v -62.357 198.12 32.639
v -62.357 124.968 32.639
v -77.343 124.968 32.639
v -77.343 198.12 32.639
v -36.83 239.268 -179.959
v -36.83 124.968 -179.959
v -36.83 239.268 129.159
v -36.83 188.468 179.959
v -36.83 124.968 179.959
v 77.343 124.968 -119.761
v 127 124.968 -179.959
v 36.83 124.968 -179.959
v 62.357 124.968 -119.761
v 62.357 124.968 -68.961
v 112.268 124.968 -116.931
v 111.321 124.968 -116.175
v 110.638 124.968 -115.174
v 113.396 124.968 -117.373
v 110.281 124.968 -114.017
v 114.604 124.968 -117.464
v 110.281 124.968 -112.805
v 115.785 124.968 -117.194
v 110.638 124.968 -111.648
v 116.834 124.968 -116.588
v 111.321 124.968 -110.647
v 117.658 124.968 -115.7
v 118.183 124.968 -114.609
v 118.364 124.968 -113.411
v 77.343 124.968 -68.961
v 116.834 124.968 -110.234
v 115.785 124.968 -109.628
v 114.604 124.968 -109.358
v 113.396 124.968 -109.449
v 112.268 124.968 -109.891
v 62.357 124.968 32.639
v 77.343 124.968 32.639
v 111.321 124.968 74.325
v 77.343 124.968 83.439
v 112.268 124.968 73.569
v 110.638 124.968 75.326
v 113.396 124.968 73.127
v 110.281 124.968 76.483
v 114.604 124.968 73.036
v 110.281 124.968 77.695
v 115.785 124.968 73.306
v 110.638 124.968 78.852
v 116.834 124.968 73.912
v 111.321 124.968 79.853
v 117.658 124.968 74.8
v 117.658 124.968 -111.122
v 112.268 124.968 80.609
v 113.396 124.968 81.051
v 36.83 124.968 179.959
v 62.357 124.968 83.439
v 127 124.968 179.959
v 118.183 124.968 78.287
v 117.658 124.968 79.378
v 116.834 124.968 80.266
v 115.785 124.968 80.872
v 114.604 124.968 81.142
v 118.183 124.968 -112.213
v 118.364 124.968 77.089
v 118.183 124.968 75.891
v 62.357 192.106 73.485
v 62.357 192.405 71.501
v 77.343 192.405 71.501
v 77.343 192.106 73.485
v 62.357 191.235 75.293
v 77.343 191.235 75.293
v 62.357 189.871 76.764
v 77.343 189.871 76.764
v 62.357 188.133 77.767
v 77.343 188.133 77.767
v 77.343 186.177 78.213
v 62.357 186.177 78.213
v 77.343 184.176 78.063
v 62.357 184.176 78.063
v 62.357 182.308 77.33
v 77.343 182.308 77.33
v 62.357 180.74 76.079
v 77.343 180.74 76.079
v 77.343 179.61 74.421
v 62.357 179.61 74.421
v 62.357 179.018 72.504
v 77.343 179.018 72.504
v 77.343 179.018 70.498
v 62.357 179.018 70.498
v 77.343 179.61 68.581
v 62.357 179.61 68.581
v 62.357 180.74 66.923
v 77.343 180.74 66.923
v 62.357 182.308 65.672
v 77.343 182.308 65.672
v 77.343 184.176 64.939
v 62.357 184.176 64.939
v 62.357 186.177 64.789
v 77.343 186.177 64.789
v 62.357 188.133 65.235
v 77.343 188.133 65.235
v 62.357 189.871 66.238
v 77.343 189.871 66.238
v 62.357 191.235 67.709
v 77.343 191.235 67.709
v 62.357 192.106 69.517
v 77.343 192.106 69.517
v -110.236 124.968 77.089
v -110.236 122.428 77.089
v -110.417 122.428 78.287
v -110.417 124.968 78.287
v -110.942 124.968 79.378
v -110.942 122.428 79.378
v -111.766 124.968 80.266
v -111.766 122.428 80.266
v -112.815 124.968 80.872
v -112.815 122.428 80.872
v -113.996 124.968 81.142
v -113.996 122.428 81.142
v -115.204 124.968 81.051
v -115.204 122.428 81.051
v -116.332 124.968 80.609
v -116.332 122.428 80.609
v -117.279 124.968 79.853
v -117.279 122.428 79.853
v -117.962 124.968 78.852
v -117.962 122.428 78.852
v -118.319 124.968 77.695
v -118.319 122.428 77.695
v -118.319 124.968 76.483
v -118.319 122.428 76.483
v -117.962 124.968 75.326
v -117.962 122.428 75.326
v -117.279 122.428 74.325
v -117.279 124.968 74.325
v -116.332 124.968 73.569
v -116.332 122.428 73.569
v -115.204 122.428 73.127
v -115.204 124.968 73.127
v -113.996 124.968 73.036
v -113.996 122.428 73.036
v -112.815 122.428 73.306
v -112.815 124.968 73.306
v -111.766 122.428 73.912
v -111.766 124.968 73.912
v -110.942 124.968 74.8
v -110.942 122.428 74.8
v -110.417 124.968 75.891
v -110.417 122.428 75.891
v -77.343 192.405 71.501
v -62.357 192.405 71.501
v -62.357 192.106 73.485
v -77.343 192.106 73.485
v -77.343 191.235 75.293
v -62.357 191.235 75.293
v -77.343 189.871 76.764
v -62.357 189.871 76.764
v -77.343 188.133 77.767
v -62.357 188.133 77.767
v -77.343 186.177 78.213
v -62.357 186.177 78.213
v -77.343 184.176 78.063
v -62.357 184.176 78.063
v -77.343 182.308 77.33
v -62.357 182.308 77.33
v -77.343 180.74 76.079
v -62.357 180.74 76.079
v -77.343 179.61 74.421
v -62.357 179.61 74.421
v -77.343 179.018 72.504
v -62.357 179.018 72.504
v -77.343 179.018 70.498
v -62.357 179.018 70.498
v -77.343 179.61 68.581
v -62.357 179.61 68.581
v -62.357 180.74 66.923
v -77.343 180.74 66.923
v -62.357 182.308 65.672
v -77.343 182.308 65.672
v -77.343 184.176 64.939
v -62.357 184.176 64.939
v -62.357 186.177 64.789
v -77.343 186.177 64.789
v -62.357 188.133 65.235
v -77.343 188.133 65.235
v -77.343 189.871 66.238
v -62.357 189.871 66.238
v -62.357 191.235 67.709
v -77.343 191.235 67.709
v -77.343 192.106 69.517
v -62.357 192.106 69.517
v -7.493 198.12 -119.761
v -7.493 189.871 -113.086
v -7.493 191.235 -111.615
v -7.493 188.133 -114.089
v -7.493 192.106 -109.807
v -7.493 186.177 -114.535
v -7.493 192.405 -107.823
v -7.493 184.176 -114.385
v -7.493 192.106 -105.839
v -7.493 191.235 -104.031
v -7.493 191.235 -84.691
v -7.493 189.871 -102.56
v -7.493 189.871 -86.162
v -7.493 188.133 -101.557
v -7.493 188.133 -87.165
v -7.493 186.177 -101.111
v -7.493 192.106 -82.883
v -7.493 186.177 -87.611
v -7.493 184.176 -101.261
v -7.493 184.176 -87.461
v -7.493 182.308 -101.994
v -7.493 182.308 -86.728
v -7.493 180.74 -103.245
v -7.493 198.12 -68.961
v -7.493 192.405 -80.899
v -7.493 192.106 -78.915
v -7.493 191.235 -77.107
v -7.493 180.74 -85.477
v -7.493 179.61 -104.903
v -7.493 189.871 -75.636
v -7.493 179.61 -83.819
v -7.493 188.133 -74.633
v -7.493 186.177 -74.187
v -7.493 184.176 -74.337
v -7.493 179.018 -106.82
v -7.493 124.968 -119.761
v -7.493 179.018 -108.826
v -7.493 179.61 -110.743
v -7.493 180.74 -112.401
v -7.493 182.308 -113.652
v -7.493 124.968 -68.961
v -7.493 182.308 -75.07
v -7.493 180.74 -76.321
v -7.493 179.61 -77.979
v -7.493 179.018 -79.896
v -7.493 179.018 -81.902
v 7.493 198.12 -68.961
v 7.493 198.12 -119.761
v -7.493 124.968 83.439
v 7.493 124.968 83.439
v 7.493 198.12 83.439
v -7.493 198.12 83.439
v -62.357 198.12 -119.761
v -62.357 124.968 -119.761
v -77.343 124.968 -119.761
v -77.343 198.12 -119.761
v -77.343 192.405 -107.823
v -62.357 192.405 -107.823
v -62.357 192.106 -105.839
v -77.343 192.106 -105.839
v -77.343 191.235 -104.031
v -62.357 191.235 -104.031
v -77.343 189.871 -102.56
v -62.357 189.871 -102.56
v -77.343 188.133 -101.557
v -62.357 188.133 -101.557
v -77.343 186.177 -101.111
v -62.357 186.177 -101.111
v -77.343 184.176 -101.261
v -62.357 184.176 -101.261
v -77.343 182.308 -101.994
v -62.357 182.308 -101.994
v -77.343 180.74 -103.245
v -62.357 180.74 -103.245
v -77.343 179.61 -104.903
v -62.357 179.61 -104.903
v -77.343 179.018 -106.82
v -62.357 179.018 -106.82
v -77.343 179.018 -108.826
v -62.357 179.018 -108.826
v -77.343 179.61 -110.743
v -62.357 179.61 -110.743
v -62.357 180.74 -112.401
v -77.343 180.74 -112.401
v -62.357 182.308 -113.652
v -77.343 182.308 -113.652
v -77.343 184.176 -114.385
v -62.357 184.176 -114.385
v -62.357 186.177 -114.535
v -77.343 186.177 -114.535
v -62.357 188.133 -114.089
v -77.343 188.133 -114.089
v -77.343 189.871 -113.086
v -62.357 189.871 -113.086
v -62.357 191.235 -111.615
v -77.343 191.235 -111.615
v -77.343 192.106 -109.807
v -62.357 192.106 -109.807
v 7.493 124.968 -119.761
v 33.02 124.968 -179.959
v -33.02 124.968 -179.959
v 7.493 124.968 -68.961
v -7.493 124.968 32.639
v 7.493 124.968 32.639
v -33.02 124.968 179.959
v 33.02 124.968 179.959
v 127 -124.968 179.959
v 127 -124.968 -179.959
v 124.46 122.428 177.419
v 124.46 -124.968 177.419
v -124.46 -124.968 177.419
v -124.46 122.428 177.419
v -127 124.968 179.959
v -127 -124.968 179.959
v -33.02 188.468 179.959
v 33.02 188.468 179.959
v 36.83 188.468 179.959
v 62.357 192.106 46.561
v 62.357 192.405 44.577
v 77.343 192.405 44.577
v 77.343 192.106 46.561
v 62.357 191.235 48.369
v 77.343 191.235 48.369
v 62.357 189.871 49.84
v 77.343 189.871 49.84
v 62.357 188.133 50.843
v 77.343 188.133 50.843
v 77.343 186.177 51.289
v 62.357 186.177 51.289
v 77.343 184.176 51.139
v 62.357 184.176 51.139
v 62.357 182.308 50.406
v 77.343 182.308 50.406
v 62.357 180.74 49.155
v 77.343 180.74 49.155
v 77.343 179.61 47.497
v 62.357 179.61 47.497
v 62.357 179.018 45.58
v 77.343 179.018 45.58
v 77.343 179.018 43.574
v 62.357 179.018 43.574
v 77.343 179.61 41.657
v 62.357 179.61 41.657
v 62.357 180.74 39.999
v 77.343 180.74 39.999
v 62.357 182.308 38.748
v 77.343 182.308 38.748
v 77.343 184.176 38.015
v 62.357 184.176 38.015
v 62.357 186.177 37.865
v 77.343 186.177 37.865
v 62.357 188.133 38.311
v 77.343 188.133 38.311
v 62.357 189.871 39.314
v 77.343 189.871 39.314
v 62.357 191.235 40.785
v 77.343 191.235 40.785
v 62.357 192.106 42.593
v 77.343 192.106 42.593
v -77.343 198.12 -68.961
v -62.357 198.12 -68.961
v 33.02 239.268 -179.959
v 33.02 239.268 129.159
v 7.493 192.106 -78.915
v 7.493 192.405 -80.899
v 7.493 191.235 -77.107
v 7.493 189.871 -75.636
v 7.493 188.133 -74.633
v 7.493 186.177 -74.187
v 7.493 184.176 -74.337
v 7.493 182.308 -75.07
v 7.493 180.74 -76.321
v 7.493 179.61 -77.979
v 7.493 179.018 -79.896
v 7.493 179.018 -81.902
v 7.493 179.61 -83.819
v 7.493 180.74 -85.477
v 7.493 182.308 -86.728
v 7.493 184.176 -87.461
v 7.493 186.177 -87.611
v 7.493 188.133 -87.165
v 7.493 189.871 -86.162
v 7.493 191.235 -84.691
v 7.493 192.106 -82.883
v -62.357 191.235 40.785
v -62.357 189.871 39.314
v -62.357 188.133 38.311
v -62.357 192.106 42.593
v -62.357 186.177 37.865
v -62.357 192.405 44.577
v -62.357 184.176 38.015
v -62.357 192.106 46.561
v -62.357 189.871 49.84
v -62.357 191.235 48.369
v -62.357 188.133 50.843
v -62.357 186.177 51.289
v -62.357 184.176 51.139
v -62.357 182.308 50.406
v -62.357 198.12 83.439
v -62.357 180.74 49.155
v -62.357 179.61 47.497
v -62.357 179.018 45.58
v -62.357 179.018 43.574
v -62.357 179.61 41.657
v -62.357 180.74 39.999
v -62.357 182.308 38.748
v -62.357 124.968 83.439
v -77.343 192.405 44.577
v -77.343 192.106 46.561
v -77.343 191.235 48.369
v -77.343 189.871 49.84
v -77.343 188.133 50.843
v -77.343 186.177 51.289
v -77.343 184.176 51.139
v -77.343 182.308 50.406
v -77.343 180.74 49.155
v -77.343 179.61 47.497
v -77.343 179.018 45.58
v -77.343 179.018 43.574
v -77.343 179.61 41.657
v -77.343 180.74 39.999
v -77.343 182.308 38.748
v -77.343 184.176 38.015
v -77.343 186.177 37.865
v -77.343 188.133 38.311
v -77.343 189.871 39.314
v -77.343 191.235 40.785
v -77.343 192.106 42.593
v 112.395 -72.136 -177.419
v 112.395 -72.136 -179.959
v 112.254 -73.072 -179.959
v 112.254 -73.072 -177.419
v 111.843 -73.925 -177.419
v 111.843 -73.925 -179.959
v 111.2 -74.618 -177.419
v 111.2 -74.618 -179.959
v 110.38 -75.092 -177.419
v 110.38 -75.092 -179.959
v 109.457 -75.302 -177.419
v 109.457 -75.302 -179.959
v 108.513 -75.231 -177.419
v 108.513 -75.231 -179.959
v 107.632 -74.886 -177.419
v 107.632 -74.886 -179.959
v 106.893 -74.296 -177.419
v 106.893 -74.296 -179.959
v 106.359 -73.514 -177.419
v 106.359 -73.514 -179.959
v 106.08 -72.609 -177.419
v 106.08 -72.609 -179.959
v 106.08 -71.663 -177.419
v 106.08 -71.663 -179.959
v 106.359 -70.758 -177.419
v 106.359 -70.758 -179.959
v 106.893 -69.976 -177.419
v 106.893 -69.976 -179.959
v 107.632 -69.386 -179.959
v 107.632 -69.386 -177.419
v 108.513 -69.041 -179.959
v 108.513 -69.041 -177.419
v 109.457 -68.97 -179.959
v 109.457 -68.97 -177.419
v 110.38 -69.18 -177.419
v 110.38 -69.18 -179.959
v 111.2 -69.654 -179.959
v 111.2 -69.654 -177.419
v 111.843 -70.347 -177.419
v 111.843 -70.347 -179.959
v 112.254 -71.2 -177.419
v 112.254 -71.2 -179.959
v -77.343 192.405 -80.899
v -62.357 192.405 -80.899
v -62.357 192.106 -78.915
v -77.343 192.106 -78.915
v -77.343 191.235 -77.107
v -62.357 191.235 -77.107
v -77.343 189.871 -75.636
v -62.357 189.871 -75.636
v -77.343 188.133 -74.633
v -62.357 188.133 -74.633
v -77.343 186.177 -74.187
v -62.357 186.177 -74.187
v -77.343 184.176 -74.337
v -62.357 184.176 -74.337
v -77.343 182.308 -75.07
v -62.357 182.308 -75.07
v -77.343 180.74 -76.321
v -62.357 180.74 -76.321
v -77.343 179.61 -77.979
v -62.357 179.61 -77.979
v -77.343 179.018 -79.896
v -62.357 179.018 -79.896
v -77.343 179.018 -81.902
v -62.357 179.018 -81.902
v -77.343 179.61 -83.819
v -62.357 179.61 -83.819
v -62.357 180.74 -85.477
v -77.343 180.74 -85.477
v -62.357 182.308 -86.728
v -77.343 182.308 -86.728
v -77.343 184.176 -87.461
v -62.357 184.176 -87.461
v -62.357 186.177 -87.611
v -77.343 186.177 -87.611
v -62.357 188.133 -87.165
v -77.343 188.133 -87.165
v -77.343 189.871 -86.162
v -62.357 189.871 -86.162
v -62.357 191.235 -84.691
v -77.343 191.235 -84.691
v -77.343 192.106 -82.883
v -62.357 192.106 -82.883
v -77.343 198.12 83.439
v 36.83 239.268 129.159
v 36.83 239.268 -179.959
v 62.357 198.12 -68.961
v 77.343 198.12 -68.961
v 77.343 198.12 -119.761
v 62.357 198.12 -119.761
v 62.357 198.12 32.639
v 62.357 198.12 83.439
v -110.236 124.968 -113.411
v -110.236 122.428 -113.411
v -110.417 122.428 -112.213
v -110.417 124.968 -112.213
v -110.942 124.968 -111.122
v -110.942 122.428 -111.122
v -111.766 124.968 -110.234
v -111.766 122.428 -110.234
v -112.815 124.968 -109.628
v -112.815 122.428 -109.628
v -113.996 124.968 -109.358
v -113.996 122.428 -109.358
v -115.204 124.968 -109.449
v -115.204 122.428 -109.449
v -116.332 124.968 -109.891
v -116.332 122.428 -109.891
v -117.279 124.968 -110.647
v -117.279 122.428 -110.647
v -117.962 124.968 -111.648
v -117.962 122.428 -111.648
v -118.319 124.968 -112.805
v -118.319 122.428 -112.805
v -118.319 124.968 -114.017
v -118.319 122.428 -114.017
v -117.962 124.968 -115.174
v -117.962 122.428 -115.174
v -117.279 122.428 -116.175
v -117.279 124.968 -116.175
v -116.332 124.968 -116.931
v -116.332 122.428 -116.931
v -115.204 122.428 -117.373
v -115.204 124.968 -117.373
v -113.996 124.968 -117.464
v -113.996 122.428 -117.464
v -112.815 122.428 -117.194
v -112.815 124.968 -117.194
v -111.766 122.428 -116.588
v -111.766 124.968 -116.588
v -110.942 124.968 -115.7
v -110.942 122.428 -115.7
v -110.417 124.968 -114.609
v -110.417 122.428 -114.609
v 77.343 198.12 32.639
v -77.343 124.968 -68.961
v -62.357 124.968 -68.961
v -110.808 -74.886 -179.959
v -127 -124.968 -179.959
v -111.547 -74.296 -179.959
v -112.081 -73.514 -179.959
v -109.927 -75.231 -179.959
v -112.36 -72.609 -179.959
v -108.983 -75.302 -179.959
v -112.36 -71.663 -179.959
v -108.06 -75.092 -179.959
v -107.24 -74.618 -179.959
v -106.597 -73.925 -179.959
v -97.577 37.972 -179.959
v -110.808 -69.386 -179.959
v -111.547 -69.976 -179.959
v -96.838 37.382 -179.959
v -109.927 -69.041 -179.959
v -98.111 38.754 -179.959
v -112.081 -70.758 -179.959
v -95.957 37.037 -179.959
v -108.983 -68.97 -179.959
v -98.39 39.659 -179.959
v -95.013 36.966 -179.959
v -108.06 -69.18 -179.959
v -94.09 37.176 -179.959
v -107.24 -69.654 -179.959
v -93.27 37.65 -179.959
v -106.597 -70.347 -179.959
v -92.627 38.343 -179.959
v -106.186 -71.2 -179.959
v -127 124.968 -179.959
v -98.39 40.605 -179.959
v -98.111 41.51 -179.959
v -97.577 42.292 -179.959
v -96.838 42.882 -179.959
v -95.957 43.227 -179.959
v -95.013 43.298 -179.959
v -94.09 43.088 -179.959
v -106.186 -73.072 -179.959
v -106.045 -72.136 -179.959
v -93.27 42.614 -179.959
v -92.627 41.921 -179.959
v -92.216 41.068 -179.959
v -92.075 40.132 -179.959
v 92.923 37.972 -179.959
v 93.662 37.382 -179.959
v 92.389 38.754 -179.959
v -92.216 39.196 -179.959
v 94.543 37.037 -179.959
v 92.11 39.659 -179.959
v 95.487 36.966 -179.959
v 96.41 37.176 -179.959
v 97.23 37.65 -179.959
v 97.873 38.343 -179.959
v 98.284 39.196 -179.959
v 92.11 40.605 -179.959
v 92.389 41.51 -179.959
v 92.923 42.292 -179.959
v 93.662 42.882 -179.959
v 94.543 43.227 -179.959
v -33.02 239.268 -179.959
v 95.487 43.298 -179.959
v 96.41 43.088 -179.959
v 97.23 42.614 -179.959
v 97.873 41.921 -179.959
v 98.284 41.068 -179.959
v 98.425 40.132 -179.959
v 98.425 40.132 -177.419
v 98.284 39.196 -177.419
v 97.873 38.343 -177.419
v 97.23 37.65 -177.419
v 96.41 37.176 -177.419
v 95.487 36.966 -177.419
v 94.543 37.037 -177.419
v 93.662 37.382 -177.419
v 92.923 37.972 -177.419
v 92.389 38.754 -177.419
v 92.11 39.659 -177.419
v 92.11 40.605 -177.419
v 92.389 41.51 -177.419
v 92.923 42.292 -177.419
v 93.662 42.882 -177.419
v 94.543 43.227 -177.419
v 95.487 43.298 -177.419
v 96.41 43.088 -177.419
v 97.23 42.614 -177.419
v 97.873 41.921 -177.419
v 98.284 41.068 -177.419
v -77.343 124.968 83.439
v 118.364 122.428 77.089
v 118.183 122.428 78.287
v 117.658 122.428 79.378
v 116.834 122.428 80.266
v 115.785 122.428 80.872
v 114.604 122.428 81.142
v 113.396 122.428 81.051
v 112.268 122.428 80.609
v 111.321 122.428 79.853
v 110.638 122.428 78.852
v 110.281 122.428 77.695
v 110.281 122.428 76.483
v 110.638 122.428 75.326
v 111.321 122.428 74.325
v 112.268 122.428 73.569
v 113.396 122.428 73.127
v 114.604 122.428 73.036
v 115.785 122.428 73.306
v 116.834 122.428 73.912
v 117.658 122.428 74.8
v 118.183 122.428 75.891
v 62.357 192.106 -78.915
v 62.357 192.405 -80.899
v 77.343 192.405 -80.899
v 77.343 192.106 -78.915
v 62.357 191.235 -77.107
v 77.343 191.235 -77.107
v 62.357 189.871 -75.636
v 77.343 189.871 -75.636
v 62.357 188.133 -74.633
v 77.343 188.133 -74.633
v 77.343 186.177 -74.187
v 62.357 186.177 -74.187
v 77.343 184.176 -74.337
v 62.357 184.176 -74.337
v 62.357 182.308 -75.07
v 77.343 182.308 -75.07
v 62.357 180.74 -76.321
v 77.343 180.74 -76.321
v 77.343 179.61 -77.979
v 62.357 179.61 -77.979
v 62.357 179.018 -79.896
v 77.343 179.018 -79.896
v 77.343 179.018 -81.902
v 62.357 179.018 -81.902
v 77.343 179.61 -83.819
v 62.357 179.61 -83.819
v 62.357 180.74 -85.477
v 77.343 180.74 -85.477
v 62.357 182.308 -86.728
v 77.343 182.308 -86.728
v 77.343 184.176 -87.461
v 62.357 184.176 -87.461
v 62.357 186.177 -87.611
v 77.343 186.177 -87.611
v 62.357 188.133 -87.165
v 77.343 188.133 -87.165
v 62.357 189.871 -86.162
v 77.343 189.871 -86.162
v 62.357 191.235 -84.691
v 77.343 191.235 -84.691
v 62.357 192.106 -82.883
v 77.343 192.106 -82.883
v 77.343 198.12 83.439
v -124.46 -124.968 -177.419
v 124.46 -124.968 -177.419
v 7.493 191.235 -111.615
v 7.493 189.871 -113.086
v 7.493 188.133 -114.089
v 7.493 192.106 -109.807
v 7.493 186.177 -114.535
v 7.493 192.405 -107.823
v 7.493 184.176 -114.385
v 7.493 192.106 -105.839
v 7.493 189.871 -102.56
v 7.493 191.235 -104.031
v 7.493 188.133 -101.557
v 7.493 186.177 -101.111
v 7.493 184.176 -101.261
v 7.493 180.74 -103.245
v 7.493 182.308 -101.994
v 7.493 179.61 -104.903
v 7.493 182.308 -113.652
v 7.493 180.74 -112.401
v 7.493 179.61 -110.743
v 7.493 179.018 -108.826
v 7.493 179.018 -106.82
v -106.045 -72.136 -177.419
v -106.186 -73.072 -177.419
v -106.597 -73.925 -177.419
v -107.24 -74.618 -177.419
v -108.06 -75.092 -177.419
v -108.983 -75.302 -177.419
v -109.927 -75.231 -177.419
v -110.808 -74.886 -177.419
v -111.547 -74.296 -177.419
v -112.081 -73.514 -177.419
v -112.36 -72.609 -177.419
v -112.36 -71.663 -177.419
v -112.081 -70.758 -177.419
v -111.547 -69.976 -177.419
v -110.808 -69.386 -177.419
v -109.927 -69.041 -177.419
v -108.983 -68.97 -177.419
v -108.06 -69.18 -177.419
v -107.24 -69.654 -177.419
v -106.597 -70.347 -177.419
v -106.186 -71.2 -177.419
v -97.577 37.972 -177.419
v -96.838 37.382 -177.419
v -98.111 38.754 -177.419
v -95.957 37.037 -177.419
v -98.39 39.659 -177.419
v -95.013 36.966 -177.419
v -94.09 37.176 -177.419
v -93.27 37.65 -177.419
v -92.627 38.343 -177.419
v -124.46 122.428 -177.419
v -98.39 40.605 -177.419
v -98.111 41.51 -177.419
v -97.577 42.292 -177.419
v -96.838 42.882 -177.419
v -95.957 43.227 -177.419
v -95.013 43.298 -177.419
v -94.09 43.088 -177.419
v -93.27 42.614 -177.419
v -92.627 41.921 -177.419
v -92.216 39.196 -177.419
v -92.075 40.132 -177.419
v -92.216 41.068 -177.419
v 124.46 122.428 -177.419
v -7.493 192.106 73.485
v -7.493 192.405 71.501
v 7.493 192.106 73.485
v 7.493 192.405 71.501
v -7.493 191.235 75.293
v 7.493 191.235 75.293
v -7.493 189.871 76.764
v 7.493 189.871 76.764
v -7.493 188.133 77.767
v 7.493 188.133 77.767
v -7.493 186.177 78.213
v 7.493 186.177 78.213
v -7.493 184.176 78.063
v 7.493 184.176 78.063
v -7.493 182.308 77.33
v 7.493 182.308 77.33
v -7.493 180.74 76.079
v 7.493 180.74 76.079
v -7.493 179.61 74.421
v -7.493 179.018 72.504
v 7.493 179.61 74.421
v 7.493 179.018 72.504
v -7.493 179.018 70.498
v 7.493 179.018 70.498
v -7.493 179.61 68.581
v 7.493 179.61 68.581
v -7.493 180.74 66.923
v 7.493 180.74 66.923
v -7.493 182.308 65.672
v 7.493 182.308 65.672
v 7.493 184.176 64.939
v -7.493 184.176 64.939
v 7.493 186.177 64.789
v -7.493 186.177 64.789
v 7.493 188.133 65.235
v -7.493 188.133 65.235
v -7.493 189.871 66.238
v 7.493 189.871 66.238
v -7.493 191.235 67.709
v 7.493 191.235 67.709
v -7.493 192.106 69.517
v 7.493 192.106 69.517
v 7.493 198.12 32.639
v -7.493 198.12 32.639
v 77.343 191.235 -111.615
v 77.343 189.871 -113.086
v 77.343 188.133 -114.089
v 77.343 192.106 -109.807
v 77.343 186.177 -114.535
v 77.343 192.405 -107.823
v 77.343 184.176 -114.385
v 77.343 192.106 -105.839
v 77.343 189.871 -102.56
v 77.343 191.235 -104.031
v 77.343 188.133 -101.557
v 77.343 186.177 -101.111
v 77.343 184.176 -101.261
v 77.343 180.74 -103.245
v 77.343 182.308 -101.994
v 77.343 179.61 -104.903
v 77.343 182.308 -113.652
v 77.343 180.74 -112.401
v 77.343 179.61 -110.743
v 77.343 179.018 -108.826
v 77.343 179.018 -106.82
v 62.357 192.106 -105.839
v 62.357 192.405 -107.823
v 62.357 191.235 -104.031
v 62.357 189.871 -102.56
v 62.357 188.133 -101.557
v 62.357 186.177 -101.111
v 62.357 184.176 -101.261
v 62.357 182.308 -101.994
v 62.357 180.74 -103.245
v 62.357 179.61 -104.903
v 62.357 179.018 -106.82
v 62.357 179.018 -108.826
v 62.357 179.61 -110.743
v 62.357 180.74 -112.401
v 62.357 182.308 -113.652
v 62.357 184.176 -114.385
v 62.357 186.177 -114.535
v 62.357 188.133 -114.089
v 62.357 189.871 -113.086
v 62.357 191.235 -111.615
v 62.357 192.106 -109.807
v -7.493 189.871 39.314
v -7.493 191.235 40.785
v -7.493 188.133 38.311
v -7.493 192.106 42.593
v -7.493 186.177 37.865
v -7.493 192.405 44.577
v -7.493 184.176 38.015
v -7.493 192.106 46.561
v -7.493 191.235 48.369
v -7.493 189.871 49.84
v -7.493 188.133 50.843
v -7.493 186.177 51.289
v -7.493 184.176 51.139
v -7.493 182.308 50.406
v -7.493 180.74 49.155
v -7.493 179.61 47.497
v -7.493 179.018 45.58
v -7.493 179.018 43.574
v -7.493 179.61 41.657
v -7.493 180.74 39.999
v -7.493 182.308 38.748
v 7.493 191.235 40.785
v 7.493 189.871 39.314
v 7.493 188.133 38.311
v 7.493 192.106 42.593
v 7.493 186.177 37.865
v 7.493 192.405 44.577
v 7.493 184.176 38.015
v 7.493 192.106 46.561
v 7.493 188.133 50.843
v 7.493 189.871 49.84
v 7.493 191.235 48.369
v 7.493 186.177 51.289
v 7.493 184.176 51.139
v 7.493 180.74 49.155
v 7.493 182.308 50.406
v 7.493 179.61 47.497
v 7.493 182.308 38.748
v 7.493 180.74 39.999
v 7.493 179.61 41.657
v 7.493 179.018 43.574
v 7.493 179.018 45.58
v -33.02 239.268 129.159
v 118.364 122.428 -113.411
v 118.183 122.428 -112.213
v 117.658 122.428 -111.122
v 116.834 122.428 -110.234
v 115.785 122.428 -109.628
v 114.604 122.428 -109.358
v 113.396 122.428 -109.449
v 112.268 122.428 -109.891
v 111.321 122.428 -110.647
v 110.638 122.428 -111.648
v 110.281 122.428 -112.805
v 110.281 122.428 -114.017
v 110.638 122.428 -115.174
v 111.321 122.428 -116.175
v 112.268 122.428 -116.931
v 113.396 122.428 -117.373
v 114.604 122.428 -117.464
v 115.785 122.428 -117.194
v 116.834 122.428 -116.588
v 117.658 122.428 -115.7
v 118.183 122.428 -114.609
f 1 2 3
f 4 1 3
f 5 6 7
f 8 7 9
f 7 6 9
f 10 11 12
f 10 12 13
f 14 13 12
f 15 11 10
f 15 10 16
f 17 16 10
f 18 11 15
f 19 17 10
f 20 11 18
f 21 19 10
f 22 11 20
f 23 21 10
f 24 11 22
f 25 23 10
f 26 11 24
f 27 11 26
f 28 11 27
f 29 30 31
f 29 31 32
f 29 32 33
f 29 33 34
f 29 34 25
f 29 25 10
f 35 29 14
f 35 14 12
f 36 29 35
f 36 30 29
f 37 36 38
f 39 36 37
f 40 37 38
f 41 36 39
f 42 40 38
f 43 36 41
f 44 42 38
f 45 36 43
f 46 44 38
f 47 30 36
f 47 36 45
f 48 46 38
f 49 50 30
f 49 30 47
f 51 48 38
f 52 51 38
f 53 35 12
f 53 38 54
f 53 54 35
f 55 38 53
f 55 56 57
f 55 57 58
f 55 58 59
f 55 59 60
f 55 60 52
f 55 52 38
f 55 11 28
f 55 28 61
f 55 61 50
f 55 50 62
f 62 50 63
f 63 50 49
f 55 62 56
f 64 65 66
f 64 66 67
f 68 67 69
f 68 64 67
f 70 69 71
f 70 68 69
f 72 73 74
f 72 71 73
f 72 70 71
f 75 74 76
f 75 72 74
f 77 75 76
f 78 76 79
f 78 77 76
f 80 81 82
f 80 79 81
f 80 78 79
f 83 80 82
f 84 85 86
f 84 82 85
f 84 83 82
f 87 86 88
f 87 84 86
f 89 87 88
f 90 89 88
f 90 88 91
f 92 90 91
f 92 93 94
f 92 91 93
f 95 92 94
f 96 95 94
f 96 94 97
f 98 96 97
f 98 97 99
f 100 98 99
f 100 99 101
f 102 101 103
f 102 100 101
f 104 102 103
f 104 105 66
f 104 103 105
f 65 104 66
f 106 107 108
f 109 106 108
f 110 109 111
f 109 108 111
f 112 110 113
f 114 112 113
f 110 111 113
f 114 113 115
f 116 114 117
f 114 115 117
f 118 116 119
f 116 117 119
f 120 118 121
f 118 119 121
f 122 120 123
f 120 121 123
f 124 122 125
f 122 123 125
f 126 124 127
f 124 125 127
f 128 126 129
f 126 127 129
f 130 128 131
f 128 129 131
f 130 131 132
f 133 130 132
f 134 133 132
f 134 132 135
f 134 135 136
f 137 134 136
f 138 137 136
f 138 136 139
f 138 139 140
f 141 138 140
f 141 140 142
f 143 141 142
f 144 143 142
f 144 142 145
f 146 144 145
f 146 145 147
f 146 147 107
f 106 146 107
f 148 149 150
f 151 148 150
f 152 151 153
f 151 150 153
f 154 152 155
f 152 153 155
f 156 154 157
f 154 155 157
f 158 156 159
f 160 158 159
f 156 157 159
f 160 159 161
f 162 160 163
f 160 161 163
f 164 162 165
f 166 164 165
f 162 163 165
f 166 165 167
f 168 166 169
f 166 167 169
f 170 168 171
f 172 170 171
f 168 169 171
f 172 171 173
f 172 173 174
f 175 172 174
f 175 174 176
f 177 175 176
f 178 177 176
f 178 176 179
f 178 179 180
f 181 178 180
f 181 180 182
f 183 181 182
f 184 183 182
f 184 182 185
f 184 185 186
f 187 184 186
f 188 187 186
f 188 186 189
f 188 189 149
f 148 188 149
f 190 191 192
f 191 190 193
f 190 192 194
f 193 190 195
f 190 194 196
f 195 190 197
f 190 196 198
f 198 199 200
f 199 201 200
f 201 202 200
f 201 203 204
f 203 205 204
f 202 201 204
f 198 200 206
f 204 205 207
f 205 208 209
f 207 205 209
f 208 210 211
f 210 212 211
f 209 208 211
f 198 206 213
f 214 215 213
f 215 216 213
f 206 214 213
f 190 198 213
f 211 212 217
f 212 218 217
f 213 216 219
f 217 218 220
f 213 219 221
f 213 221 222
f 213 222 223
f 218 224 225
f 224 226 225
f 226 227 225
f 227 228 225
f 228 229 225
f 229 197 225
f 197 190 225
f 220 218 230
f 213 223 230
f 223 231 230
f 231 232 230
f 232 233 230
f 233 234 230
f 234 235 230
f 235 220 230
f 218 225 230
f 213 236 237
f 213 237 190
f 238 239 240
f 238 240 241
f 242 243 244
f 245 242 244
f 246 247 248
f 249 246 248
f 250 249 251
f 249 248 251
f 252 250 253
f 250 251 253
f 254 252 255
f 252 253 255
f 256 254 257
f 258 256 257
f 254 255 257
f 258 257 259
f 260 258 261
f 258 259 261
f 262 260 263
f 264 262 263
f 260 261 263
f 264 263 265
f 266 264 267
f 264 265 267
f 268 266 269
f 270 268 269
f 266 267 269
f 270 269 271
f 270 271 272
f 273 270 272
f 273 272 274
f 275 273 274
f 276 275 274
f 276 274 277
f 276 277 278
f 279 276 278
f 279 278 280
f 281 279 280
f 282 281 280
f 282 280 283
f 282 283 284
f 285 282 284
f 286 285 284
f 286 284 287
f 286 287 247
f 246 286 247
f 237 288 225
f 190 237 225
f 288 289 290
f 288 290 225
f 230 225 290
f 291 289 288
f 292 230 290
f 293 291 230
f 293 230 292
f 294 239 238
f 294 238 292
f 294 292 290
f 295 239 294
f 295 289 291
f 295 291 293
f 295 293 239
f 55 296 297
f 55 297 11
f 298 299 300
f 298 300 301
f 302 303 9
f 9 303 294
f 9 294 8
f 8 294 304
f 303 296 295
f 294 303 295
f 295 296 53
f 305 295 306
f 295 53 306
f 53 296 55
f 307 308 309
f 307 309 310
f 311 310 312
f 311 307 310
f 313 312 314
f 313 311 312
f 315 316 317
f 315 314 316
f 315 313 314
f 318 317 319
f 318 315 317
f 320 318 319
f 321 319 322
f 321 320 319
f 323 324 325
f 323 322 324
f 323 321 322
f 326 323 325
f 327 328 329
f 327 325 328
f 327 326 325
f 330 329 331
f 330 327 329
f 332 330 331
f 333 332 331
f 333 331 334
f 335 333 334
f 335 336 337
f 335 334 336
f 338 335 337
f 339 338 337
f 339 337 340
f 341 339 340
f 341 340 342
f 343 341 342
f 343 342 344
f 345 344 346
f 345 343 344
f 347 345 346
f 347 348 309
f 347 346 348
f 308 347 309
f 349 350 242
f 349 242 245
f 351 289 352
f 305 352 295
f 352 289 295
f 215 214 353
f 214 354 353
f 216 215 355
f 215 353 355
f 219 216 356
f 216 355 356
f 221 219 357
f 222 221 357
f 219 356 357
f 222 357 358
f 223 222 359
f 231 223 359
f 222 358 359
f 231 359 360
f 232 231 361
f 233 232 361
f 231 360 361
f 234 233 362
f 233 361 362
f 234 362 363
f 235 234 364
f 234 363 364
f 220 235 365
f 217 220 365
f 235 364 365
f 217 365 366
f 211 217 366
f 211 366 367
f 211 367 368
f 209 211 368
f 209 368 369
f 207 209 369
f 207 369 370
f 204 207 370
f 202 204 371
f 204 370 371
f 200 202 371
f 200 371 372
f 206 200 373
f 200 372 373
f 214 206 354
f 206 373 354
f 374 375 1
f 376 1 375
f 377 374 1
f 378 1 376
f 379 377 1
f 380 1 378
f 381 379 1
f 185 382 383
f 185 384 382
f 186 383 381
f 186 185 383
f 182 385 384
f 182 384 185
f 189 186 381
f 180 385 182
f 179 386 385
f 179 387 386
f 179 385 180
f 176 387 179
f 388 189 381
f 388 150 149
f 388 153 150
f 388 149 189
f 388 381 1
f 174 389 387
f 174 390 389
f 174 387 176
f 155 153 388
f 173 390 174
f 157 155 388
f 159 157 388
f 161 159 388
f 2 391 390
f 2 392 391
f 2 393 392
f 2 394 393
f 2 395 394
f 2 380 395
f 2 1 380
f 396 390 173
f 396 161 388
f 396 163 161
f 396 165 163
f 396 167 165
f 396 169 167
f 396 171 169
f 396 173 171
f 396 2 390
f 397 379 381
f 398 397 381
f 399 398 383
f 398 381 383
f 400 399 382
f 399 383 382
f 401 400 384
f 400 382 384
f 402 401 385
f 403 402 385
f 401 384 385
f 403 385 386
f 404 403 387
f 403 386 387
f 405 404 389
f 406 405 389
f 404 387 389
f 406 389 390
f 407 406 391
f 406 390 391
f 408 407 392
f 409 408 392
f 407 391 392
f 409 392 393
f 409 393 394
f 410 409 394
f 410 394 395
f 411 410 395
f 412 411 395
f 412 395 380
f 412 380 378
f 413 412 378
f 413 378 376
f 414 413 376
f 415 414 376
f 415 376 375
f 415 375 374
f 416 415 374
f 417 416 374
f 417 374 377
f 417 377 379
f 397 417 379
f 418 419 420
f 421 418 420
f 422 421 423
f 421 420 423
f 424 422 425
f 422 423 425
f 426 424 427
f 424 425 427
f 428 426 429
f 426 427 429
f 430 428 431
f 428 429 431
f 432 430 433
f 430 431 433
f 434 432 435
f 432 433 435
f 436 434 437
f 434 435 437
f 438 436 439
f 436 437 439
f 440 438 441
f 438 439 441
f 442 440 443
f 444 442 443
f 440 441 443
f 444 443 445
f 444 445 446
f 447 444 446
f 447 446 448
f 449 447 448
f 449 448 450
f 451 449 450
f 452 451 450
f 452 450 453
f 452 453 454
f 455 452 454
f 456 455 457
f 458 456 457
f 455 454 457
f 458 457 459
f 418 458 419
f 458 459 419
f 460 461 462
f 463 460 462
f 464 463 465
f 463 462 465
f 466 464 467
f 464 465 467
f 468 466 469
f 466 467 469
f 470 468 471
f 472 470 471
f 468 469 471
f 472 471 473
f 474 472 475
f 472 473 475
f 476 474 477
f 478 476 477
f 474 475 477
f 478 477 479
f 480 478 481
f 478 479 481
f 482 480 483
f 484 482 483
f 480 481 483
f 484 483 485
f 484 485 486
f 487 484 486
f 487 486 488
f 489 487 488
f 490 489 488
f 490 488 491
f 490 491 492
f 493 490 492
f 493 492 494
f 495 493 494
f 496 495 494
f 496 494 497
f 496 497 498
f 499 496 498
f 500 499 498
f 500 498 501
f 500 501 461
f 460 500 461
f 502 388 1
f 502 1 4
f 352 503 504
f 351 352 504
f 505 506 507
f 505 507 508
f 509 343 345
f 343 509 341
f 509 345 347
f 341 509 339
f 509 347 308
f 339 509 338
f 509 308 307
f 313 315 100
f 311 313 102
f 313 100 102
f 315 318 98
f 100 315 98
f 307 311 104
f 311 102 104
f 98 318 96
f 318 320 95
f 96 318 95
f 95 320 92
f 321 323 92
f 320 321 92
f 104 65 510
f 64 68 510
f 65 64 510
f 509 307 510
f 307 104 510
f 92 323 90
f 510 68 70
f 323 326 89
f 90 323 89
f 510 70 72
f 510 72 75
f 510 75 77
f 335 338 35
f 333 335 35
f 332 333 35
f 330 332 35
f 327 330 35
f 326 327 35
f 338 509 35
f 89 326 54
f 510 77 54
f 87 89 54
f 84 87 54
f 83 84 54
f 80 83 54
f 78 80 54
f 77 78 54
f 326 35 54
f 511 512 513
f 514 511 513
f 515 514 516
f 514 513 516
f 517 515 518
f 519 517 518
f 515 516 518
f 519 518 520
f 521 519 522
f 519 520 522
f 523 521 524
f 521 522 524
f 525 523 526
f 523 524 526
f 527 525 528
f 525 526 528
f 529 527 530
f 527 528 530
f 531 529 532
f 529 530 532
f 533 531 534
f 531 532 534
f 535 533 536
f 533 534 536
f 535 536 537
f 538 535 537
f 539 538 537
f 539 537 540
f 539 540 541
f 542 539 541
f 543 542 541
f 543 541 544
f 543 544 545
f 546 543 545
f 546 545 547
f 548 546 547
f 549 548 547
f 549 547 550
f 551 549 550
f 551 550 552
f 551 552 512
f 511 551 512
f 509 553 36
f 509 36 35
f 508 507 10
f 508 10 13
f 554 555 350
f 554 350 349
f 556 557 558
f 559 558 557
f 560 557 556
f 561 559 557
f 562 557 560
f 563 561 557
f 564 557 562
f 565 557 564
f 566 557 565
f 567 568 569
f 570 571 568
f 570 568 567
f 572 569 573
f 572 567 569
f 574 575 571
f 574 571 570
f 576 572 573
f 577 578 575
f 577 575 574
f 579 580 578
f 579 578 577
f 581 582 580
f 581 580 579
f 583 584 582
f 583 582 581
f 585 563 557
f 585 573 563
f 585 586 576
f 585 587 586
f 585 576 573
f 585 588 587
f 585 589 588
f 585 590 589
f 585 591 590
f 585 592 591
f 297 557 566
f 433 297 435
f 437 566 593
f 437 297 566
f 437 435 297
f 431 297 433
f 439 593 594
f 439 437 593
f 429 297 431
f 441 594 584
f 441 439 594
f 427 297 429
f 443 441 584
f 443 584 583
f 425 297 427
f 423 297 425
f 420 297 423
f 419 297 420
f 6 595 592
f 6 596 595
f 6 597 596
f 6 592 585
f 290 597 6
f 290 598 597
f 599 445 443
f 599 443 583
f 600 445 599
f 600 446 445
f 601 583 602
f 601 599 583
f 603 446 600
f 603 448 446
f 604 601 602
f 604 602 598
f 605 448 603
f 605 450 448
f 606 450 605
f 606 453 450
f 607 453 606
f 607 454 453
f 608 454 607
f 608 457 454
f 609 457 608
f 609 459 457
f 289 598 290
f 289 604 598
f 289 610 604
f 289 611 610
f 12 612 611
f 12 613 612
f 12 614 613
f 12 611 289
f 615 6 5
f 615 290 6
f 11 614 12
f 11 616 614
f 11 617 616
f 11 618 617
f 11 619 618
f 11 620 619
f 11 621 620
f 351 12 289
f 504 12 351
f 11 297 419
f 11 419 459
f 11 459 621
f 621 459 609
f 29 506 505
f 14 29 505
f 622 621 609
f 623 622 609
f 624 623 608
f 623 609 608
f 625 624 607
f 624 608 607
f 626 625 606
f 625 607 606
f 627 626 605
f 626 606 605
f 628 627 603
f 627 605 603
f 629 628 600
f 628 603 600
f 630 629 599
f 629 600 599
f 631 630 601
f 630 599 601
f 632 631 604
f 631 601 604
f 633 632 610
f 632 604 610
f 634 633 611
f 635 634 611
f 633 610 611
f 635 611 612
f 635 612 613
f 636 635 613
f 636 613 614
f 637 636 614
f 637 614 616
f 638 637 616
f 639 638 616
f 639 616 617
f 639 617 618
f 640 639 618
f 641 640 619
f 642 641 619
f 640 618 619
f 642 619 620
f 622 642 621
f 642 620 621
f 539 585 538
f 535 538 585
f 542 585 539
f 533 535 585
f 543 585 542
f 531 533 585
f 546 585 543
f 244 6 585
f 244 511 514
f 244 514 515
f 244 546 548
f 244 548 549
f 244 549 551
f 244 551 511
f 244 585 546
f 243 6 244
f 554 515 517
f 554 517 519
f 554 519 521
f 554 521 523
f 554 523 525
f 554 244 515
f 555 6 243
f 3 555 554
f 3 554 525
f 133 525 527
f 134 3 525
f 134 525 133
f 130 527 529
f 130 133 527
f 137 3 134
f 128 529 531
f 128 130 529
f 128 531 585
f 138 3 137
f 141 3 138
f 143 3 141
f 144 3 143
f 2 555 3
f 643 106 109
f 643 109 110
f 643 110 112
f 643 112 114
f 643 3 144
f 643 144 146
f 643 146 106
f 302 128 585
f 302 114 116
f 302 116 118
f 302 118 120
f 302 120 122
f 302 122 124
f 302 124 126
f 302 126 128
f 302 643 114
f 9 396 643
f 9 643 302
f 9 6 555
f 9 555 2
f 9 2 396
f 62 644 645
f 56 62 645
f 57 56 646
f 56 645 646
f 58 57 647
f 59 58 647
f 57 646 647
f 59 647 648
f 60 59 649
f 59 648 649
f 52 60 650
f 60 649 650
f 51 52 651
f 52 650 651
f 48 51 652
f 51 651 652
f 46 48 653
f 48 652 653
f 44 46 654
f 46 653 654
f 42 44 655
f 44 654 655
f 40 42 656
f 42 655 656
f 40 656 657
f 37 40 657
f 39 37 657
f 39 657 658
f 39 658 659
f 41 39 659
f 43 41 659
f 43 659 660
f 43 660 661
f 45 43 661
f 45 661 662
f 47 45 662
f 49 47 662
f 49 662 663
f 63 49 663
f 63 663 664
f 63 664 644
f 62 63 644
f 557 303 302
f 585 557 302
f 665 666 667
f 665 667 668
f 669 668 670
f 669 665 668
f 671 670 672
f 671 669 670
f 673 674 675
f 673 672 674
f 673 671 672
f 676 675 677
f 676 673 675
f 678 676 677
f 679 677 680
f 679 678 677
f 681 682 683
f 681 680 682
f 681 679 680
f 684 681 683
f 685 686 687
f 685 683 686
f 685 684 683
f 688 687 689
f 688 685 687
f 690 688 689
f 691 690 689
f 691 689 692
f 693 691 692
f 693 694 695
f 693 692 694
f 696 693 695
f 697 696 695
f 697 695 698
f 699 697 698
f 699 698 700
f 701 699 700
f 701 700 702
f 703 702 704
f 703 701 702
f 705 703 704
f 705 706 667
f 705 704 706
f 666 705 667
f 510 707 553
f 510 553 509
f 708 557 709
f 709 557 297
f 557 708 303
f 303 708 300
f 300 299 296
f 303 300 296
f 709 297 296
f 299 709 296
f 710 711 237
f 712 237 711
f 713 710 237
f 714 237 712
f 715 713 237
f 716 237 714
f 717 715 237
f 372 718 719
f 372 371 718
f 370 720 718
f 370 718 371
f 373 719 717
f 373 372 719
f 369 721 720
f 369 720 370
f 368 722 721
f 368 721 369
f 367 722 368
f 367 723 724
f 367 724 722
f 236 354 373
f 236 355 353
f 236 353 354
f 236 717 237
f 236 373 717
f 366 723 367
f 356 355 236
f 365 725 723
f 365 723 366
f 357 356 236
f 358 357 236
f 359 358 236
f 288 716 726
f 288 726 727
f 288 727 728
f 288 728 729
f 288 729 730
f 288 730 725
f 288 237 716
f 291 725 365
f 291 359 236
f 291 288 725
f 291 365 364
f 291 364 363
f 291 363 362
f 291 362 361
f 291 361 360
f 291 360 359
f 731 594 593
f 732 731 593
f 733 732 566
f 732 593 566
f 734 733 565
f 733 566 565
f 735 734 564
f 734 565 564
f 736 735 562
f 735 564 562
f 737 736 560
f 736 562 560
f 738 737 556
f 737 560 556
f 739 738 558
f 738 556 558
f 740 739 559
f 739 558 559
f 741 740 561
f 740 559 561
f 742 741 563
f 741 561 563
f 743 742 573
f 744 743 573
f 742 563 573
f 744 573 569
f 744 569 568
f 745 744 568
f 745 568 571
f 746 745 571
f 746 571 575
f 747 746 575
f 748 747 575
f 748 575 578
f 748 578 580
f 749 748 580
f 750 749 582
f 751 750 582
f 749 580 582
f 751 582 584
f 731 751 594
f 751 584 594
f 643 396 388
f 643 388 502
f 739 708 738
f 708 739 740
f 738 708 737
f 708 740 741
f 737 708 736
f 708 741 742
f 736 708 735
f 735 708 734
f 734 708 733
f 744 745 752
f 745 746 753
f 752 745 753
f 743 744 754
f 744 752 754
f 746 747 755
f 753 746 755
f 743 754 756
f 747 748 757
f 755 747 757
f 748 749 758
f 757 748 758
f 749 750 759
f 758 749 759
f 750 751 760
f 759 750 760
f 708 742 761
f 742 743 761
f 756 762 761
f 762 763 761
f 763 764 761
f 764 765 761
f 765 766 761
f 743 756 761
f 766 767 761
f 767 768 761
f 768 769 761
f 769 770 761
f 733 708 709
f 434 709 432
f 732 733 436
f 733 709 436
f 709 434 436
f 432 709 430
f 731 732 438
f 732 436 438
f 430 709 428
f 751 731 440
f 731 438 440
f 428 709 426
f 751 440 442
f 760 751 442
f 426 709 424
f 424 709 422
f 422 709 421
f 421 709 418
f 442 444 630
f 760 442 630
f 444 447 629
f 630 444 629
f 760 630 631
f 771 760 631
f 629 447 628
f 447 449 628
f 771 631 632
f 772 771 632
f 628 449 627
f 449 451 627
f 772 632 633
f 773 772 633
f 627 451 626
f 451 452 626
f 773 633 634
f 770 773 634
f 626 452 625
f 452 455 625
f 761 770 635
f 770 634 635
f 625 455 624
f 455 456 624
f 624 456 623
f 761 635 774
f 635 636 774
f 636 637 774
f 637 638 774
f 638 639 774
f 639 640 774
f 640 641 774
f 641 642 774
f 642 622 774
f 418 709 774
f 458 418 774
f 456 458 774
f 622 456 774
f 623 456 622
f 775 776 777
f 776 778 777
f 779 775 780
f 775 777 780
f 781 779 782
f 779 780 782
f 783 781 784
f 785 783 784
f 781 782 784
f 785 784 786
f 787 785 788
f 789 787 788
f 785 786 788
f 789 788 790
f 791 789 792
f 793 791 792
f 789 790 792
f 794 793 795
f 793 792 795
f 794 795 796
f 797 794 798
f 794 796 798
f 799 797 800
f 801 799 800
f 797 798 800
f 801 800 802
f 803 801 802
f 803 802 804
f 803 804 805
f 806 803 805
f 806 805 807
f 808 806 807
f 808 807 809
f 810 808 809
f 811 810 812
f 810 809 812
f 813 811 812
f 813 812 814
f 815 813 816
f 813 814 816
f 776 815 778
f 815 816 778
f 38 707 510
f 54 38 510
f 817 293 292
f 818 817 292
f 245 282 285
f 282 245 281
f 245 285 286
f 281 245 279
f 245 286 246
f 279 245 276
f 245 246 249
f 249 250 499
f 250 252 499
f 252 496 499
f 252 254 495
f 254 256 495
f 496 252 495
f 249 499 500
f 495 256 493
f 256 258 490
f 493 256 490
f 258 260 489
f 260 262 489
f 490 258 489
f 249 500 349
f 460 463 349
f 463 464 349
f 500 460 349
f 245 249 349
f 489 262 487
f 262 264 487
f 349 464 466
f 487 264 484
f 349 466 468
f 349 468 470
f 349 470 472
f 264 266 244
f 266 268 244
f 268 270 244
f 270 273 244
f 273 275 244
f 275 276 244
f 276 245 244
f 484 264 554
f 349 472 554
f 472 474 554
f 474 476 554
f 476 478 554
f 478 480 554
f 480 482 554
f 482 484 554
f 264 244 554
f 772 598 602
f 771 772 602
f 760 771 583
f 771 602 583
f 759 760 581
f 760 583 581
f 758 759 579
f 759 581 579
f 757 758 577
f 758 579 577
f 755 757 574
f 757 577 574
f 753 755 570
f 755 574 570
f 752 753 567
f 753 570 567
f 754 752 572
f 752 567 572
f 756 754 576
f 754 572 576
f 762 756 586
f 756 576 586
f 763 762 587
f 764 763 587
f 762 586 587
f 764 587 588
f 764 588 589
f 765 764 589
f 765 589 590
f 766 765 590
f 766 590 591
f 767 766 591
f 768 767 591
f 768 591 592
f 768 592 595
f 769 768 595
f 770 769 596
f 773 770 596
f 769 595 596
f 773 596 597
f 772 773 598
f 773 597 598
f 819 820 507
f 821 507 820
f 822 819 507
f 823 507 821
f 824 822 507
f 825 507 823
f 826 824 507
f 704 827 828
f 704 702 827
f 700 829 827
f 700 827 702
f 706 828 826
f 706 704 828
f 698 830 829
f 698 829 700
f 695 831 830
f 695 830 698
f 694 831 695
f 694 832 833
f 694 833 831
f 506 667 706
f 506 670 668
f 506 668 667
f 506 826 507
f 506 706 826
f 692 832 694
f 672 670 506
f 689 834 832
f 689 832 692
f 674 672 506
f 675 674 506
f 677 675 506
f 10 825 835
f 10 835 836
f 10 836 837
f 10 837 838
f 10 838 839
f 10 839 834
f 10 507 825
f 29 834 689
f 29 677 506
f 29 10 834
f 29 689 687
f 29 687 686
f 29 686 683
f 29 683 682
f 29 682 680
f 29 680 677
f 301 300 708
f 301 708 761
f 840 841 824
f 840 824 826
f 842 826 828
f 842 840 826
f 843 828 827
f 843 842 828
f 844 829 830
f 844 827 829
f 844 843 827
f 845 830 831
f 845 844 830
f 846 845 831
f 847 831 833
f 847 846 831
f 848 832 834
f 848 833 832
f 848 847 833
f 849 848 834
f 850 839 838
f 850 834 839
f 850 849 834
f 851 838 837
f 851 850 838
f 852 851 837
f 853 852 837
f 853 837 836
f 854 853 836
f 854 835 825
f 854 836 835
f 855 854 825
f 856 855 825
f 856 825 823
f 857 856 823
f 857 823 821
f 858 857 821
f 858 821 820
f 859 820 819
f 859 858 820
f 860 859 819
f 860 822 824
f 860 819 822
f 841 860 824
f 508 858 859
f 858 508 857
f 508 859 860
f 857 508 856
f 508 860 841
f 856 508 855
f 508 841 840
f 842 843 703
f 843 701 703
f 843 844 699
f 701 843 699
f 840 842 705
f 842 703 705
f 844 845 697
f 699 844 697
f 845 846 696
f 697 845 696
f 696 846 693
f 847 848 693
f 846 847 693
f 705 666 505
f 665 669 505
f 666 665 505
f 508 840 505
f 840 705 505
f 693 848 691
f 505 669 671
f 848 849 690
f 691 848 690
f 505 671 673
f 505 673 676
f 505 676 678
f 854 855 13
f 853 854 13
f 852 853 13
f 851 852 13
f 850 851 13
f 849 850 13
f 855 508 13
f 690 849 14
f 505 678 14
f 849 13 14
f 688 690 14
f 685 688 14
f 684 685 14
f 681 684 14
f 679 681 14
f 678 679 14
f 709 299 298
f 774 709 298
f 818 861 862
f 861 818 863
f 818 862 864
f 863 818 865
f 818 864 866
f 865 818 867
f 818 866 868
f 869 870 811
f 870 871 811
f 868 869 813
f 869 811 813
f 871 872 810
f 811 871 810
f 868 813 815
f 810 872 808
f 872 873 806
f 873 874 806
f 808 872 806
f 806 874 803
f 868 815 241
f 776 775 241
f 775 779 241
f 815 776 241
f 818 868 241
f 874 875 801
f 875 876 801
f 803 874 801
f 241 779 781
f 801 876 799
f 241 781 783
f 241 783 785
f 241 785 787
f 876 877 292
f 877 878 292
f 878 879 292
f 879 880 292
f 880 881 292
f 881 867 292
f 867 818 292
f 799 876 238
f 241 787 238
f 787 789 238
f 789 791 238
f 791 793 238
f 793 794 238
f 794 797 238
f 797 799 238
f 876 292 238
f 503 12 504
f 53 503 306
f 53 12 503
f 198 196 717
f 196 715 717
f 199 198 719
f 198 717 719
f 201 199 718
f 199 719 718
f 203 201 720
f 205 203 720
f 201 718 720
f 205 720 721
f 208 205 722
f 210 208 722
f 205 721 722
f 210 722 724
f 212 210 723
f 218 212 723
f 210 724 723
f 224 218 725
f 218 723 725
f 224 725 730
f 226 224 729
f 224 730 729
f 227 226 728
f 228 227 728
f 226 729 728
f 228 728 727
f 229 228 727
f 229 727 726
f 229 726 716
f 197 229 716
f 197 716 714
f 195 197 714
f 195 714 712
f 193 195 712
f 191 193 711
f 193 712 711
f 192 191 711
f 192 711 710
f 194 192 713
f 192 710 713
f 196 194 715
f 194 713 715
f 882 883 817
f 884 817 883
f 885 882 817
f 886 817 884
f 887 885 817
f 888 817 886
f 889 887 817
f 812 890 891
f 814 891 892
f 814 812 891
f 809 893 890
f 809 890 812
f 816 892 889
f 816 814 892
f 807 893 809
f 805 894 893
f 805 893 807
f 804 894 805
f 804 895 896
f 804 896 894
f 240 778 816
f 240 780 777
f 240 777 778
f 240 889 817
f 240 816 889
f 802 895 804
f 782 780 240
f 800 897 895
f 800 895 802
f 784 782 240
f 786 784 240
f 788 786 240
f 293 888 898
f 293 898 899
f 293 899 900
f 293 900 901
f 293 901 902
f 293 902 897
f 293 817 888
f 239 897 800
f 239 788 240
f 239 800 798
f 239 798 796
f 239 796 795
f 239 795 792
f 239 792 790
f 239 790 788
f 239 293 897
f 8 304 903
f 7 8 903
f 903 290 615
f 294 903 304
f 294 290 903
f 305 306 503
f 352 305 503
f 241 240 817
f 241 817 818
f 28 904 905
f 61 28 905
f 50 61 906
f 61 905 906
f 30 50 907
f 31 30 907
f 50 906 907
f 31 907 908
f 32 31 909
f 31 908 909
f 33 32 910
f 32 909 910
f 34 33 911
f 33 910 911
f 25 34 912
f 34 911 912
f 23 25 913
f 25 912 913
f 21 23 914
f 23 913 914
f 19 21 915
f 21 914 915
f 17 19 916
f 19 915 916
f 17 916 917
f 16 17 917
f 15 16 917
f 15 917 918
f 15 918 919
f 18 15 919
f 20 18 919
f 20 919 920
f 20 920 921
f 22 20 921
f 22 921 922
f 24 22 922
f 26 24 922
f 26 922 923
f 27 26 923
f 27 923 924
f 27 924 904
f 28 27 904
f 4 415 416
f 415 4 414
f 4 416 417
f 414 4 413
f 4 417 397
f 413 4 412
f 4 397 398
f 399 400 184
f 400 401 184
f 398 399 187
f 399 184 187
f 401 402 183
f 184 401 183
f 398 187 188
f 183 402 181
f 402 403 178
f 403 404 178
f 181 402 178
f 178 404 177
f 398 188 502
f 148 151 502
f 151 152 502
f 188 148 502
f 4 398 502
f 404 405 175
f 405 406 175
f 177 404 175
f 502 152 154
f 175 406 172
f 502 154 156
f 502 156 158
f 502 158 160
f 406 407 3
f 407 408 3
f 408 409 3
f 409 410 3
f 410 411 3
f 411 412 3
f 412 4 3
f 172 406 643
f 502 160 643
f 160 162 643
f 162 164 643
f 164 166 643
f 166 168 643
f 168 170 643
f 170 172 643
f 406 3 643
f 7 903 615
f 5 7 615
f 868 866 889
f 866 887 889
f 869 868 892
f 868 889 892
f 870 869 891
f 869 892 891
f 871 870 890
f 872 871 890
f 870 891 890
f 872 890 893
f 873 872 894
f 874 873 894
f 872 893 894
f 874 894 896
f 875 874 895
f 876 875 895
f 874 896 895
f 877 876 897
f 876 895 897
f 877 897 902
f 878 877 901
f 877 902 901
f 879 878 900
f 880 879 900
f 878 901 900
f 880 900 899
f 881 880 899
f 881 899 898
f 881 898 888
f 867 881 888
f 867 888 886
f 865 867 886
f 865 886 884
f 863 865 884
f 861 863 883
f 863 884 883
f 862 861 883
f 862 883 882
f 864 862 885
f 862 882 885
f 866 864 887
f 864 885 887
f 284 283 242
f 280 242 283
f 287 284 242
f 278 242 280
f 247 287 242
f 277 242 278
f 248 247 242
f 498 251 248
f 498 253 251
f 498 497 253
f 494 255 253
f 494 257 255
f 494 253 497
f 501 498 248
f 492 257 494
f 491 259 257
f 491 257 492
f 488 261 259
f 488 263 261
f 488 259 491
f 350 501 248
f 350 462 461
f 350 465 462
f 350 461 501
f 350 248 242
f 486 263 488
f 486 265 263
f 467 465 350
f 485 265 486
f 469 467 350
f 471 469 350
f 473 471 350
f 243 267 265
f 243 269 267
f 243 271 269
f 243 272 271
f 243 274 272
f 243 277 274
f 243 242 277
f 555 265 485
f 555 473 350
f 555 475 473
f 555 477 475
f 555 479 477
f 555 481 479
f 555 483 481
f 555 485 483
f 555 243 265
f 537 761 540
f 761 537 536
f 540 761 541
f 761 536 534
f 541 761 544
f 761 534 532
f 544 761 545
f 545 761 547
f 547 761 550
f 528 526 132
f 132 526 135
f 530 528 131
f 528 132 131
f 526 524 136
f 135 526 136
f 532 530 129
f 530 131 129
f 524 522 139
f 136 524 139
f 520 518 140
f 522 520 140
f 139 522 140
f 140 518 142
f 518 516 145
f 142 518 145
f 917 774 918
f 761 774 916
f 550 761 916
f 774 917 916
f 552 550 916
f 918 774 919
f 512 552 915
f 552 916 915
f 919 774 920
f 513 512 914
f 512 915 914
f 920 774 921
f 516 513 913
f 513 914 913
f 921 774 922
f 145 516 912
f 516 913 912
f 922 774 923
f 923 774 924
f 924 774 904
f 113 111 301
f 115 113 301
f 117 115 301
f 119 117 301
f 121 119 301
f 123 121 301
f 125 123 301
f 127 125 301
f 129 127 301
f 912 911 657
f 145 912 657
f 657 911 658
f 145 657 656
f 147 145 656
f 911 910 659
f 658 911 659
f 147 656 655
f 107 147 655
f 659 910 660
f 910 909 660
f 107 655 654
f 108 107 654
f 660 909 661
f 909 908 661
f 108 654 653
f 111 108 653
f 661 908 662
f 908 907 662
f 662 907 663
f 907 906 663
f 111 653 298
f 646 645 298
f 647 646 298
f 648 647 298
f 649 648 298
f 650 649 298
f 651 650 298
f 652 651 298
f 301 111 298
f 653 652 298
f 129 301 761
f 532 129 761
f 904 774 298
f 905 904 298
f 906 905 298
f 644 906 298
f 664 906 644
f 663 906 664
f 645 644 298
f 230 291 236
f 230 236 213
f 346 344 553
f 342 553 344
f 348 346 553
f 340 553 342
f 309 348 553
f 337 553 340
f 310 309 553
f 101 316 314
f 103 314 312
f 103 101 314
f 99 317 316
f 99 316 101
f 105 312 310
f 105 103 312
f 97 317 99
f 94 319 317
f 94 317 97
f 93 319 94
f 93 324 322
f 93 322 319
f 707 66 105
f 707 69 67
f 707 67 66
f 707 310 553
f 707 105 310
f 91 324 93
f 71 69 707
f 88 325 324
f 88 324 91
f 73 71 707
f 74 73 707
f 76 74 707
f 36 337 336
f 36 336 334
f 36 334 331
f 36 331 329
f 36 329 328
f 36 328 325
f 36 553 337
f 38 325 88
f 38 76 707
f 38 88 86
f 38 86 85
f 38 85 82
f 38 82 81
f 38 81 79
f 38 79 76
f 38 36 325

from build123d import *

# Parameters (mm, degrees)
F0_W          = 249.936
F0_H          = 359.918
F1_DEPTH      = 127
F2_T          = -2.54
F3_W          = 14.986
F3_H          = 50.8
F4_DEPTH      = 73.152
F5_R          = 6.731
F6_DEPTH      = 127.001
F6_DEPTH_BACK = 127.001
F7_R          = 3.175
F8_DEPTH      = 2.54
F9_R          = 4.064
F10_DEPTH     = 75.693
F11_W         = 3.81
F11_H         = 359.918
F12_DEPTH     = 139.7
F14_DEPTH     = 163.831


with BuildPart() as f1:
    # F0 (on Right) → F1 (new body, symmetric)
    with BuildSketch(Plane.YZ):
        Rectangle(F0_W, F0_H)
    extrude(amount=F1_DEPTH, both=True)

    # F2
    f2_openings = [f1.faces().sort_by_distance(p)[0] for p in [
        (0, -124.968, 0),
    ]]
    offset(amount=F2_T, openings=f2_openings)

    # F3 (on face) → F4 (join)
    with BuildSketch(Plane(origin=(0, 124.968, 0), x_dir=(-1, 0, 0), z_dir=(0, 1, 0))):
        with Locations((69.85, -94.361)):
            Rectangle(F3_W, F3_H)
        with Locations((69.85, 58.039)):
            Rectangle(F3_W, F3_H)
        with Locations((0, -94.361)):
            Rectangle(F3_W, F3_H)
        with Locations((0, 58.039)):
            Rectangle(F3_W, F3_H)
        with Locations((-69.85, -94.361)):
            Rectangle(F3_W, F3_H)
        with Locations((-69.85, 58.039)):
            Rectangle(F3_W, F3_H)
    extrude(amount=F4_DEPTH)

    # F5 (on Right) → F6 (cut, two sides)
    with BuildSketch(Plane.YZ) as f6_sk:
        with Locations((185.674, 71.501)):
            Circle(F5_R)
        with Locations((185.674, 44.577)):
            Circle(F5_R)
        with Locations((185.674, -80.899)):
            Circle(F5_R)
        with Locations((185.674, -107.823)):
            Circle(F5_R)
    extrude(amount=F6_DEPTH, mode=Mode.SUBTRACT)
    extrude(f6_sk.sketch, amount=-F6_DEPTH_BACK, mode=Mode.SUBTRACT)

    # F7 (on face) → F8 (cut, through all)
    with BuildSketch(Plane(origin=(0, 0, -179.959), x_dir=(1, 0, 0), z_dir=(0, 0, -1))):
        with Locations((-109.22, 72.136)):
            Circle(F7_R)
        with Locations((109.22, 72.136)):
            Circle(F7_R)
        with Locations((95.25, -40.132)):
            Circle(F7_R)
        with Locations((-95.25, -40.132)):
            Circle(F7_R)
    extrude(amount=-F8_DEPTH, mode=Mode.SUBTRACT)

    # F9 (on face) → F10 (cut, through all)
    with BuildSketch(Plane.XZ.offset(-122.428)):
        with Locations((-114.3, 77.089)):
            Circle(F9_R)
        with Locations((114.3, 77.089)):
            Circle(F9_R)
        with Locations((114.3, -113.411)):
            Circle(F9_R)
        with Locations((-114.3, -113.411)):
            Circle(F9_R)
    extrude(amount=-F10_DEPTH, mode=Mode.SUBTRACT)

    # F11 (on face) → F12 (join)
    with BuildSketch(Plane(origin=(0, 124.968, 0), x_dir=(-1, 0, 0), z_dir=(0, 1, 0))):
        with Locations((-34.925, 0)):
            Rectangle(F11_W, F11_H)
        with Locations((34.925, 0)):
            Rectangle(F11_W, F11_H)
    extrude(amount=F12_DEPTH)

    # F13 (on face) → F14 (cut, through all)
    with BuildSketch(Plane.YZ.offset(36.83)):
        Polygon((264.668, 103.759), (264.668, 179.959), (188.468, 179.959), (239.268, 129.159), (239.268, -179.959), (264.668, -179.959), align=None)
    extrude(amount=-F14_DEPTH, mode=Mode.SUBTRACT)


solid = f1.part
